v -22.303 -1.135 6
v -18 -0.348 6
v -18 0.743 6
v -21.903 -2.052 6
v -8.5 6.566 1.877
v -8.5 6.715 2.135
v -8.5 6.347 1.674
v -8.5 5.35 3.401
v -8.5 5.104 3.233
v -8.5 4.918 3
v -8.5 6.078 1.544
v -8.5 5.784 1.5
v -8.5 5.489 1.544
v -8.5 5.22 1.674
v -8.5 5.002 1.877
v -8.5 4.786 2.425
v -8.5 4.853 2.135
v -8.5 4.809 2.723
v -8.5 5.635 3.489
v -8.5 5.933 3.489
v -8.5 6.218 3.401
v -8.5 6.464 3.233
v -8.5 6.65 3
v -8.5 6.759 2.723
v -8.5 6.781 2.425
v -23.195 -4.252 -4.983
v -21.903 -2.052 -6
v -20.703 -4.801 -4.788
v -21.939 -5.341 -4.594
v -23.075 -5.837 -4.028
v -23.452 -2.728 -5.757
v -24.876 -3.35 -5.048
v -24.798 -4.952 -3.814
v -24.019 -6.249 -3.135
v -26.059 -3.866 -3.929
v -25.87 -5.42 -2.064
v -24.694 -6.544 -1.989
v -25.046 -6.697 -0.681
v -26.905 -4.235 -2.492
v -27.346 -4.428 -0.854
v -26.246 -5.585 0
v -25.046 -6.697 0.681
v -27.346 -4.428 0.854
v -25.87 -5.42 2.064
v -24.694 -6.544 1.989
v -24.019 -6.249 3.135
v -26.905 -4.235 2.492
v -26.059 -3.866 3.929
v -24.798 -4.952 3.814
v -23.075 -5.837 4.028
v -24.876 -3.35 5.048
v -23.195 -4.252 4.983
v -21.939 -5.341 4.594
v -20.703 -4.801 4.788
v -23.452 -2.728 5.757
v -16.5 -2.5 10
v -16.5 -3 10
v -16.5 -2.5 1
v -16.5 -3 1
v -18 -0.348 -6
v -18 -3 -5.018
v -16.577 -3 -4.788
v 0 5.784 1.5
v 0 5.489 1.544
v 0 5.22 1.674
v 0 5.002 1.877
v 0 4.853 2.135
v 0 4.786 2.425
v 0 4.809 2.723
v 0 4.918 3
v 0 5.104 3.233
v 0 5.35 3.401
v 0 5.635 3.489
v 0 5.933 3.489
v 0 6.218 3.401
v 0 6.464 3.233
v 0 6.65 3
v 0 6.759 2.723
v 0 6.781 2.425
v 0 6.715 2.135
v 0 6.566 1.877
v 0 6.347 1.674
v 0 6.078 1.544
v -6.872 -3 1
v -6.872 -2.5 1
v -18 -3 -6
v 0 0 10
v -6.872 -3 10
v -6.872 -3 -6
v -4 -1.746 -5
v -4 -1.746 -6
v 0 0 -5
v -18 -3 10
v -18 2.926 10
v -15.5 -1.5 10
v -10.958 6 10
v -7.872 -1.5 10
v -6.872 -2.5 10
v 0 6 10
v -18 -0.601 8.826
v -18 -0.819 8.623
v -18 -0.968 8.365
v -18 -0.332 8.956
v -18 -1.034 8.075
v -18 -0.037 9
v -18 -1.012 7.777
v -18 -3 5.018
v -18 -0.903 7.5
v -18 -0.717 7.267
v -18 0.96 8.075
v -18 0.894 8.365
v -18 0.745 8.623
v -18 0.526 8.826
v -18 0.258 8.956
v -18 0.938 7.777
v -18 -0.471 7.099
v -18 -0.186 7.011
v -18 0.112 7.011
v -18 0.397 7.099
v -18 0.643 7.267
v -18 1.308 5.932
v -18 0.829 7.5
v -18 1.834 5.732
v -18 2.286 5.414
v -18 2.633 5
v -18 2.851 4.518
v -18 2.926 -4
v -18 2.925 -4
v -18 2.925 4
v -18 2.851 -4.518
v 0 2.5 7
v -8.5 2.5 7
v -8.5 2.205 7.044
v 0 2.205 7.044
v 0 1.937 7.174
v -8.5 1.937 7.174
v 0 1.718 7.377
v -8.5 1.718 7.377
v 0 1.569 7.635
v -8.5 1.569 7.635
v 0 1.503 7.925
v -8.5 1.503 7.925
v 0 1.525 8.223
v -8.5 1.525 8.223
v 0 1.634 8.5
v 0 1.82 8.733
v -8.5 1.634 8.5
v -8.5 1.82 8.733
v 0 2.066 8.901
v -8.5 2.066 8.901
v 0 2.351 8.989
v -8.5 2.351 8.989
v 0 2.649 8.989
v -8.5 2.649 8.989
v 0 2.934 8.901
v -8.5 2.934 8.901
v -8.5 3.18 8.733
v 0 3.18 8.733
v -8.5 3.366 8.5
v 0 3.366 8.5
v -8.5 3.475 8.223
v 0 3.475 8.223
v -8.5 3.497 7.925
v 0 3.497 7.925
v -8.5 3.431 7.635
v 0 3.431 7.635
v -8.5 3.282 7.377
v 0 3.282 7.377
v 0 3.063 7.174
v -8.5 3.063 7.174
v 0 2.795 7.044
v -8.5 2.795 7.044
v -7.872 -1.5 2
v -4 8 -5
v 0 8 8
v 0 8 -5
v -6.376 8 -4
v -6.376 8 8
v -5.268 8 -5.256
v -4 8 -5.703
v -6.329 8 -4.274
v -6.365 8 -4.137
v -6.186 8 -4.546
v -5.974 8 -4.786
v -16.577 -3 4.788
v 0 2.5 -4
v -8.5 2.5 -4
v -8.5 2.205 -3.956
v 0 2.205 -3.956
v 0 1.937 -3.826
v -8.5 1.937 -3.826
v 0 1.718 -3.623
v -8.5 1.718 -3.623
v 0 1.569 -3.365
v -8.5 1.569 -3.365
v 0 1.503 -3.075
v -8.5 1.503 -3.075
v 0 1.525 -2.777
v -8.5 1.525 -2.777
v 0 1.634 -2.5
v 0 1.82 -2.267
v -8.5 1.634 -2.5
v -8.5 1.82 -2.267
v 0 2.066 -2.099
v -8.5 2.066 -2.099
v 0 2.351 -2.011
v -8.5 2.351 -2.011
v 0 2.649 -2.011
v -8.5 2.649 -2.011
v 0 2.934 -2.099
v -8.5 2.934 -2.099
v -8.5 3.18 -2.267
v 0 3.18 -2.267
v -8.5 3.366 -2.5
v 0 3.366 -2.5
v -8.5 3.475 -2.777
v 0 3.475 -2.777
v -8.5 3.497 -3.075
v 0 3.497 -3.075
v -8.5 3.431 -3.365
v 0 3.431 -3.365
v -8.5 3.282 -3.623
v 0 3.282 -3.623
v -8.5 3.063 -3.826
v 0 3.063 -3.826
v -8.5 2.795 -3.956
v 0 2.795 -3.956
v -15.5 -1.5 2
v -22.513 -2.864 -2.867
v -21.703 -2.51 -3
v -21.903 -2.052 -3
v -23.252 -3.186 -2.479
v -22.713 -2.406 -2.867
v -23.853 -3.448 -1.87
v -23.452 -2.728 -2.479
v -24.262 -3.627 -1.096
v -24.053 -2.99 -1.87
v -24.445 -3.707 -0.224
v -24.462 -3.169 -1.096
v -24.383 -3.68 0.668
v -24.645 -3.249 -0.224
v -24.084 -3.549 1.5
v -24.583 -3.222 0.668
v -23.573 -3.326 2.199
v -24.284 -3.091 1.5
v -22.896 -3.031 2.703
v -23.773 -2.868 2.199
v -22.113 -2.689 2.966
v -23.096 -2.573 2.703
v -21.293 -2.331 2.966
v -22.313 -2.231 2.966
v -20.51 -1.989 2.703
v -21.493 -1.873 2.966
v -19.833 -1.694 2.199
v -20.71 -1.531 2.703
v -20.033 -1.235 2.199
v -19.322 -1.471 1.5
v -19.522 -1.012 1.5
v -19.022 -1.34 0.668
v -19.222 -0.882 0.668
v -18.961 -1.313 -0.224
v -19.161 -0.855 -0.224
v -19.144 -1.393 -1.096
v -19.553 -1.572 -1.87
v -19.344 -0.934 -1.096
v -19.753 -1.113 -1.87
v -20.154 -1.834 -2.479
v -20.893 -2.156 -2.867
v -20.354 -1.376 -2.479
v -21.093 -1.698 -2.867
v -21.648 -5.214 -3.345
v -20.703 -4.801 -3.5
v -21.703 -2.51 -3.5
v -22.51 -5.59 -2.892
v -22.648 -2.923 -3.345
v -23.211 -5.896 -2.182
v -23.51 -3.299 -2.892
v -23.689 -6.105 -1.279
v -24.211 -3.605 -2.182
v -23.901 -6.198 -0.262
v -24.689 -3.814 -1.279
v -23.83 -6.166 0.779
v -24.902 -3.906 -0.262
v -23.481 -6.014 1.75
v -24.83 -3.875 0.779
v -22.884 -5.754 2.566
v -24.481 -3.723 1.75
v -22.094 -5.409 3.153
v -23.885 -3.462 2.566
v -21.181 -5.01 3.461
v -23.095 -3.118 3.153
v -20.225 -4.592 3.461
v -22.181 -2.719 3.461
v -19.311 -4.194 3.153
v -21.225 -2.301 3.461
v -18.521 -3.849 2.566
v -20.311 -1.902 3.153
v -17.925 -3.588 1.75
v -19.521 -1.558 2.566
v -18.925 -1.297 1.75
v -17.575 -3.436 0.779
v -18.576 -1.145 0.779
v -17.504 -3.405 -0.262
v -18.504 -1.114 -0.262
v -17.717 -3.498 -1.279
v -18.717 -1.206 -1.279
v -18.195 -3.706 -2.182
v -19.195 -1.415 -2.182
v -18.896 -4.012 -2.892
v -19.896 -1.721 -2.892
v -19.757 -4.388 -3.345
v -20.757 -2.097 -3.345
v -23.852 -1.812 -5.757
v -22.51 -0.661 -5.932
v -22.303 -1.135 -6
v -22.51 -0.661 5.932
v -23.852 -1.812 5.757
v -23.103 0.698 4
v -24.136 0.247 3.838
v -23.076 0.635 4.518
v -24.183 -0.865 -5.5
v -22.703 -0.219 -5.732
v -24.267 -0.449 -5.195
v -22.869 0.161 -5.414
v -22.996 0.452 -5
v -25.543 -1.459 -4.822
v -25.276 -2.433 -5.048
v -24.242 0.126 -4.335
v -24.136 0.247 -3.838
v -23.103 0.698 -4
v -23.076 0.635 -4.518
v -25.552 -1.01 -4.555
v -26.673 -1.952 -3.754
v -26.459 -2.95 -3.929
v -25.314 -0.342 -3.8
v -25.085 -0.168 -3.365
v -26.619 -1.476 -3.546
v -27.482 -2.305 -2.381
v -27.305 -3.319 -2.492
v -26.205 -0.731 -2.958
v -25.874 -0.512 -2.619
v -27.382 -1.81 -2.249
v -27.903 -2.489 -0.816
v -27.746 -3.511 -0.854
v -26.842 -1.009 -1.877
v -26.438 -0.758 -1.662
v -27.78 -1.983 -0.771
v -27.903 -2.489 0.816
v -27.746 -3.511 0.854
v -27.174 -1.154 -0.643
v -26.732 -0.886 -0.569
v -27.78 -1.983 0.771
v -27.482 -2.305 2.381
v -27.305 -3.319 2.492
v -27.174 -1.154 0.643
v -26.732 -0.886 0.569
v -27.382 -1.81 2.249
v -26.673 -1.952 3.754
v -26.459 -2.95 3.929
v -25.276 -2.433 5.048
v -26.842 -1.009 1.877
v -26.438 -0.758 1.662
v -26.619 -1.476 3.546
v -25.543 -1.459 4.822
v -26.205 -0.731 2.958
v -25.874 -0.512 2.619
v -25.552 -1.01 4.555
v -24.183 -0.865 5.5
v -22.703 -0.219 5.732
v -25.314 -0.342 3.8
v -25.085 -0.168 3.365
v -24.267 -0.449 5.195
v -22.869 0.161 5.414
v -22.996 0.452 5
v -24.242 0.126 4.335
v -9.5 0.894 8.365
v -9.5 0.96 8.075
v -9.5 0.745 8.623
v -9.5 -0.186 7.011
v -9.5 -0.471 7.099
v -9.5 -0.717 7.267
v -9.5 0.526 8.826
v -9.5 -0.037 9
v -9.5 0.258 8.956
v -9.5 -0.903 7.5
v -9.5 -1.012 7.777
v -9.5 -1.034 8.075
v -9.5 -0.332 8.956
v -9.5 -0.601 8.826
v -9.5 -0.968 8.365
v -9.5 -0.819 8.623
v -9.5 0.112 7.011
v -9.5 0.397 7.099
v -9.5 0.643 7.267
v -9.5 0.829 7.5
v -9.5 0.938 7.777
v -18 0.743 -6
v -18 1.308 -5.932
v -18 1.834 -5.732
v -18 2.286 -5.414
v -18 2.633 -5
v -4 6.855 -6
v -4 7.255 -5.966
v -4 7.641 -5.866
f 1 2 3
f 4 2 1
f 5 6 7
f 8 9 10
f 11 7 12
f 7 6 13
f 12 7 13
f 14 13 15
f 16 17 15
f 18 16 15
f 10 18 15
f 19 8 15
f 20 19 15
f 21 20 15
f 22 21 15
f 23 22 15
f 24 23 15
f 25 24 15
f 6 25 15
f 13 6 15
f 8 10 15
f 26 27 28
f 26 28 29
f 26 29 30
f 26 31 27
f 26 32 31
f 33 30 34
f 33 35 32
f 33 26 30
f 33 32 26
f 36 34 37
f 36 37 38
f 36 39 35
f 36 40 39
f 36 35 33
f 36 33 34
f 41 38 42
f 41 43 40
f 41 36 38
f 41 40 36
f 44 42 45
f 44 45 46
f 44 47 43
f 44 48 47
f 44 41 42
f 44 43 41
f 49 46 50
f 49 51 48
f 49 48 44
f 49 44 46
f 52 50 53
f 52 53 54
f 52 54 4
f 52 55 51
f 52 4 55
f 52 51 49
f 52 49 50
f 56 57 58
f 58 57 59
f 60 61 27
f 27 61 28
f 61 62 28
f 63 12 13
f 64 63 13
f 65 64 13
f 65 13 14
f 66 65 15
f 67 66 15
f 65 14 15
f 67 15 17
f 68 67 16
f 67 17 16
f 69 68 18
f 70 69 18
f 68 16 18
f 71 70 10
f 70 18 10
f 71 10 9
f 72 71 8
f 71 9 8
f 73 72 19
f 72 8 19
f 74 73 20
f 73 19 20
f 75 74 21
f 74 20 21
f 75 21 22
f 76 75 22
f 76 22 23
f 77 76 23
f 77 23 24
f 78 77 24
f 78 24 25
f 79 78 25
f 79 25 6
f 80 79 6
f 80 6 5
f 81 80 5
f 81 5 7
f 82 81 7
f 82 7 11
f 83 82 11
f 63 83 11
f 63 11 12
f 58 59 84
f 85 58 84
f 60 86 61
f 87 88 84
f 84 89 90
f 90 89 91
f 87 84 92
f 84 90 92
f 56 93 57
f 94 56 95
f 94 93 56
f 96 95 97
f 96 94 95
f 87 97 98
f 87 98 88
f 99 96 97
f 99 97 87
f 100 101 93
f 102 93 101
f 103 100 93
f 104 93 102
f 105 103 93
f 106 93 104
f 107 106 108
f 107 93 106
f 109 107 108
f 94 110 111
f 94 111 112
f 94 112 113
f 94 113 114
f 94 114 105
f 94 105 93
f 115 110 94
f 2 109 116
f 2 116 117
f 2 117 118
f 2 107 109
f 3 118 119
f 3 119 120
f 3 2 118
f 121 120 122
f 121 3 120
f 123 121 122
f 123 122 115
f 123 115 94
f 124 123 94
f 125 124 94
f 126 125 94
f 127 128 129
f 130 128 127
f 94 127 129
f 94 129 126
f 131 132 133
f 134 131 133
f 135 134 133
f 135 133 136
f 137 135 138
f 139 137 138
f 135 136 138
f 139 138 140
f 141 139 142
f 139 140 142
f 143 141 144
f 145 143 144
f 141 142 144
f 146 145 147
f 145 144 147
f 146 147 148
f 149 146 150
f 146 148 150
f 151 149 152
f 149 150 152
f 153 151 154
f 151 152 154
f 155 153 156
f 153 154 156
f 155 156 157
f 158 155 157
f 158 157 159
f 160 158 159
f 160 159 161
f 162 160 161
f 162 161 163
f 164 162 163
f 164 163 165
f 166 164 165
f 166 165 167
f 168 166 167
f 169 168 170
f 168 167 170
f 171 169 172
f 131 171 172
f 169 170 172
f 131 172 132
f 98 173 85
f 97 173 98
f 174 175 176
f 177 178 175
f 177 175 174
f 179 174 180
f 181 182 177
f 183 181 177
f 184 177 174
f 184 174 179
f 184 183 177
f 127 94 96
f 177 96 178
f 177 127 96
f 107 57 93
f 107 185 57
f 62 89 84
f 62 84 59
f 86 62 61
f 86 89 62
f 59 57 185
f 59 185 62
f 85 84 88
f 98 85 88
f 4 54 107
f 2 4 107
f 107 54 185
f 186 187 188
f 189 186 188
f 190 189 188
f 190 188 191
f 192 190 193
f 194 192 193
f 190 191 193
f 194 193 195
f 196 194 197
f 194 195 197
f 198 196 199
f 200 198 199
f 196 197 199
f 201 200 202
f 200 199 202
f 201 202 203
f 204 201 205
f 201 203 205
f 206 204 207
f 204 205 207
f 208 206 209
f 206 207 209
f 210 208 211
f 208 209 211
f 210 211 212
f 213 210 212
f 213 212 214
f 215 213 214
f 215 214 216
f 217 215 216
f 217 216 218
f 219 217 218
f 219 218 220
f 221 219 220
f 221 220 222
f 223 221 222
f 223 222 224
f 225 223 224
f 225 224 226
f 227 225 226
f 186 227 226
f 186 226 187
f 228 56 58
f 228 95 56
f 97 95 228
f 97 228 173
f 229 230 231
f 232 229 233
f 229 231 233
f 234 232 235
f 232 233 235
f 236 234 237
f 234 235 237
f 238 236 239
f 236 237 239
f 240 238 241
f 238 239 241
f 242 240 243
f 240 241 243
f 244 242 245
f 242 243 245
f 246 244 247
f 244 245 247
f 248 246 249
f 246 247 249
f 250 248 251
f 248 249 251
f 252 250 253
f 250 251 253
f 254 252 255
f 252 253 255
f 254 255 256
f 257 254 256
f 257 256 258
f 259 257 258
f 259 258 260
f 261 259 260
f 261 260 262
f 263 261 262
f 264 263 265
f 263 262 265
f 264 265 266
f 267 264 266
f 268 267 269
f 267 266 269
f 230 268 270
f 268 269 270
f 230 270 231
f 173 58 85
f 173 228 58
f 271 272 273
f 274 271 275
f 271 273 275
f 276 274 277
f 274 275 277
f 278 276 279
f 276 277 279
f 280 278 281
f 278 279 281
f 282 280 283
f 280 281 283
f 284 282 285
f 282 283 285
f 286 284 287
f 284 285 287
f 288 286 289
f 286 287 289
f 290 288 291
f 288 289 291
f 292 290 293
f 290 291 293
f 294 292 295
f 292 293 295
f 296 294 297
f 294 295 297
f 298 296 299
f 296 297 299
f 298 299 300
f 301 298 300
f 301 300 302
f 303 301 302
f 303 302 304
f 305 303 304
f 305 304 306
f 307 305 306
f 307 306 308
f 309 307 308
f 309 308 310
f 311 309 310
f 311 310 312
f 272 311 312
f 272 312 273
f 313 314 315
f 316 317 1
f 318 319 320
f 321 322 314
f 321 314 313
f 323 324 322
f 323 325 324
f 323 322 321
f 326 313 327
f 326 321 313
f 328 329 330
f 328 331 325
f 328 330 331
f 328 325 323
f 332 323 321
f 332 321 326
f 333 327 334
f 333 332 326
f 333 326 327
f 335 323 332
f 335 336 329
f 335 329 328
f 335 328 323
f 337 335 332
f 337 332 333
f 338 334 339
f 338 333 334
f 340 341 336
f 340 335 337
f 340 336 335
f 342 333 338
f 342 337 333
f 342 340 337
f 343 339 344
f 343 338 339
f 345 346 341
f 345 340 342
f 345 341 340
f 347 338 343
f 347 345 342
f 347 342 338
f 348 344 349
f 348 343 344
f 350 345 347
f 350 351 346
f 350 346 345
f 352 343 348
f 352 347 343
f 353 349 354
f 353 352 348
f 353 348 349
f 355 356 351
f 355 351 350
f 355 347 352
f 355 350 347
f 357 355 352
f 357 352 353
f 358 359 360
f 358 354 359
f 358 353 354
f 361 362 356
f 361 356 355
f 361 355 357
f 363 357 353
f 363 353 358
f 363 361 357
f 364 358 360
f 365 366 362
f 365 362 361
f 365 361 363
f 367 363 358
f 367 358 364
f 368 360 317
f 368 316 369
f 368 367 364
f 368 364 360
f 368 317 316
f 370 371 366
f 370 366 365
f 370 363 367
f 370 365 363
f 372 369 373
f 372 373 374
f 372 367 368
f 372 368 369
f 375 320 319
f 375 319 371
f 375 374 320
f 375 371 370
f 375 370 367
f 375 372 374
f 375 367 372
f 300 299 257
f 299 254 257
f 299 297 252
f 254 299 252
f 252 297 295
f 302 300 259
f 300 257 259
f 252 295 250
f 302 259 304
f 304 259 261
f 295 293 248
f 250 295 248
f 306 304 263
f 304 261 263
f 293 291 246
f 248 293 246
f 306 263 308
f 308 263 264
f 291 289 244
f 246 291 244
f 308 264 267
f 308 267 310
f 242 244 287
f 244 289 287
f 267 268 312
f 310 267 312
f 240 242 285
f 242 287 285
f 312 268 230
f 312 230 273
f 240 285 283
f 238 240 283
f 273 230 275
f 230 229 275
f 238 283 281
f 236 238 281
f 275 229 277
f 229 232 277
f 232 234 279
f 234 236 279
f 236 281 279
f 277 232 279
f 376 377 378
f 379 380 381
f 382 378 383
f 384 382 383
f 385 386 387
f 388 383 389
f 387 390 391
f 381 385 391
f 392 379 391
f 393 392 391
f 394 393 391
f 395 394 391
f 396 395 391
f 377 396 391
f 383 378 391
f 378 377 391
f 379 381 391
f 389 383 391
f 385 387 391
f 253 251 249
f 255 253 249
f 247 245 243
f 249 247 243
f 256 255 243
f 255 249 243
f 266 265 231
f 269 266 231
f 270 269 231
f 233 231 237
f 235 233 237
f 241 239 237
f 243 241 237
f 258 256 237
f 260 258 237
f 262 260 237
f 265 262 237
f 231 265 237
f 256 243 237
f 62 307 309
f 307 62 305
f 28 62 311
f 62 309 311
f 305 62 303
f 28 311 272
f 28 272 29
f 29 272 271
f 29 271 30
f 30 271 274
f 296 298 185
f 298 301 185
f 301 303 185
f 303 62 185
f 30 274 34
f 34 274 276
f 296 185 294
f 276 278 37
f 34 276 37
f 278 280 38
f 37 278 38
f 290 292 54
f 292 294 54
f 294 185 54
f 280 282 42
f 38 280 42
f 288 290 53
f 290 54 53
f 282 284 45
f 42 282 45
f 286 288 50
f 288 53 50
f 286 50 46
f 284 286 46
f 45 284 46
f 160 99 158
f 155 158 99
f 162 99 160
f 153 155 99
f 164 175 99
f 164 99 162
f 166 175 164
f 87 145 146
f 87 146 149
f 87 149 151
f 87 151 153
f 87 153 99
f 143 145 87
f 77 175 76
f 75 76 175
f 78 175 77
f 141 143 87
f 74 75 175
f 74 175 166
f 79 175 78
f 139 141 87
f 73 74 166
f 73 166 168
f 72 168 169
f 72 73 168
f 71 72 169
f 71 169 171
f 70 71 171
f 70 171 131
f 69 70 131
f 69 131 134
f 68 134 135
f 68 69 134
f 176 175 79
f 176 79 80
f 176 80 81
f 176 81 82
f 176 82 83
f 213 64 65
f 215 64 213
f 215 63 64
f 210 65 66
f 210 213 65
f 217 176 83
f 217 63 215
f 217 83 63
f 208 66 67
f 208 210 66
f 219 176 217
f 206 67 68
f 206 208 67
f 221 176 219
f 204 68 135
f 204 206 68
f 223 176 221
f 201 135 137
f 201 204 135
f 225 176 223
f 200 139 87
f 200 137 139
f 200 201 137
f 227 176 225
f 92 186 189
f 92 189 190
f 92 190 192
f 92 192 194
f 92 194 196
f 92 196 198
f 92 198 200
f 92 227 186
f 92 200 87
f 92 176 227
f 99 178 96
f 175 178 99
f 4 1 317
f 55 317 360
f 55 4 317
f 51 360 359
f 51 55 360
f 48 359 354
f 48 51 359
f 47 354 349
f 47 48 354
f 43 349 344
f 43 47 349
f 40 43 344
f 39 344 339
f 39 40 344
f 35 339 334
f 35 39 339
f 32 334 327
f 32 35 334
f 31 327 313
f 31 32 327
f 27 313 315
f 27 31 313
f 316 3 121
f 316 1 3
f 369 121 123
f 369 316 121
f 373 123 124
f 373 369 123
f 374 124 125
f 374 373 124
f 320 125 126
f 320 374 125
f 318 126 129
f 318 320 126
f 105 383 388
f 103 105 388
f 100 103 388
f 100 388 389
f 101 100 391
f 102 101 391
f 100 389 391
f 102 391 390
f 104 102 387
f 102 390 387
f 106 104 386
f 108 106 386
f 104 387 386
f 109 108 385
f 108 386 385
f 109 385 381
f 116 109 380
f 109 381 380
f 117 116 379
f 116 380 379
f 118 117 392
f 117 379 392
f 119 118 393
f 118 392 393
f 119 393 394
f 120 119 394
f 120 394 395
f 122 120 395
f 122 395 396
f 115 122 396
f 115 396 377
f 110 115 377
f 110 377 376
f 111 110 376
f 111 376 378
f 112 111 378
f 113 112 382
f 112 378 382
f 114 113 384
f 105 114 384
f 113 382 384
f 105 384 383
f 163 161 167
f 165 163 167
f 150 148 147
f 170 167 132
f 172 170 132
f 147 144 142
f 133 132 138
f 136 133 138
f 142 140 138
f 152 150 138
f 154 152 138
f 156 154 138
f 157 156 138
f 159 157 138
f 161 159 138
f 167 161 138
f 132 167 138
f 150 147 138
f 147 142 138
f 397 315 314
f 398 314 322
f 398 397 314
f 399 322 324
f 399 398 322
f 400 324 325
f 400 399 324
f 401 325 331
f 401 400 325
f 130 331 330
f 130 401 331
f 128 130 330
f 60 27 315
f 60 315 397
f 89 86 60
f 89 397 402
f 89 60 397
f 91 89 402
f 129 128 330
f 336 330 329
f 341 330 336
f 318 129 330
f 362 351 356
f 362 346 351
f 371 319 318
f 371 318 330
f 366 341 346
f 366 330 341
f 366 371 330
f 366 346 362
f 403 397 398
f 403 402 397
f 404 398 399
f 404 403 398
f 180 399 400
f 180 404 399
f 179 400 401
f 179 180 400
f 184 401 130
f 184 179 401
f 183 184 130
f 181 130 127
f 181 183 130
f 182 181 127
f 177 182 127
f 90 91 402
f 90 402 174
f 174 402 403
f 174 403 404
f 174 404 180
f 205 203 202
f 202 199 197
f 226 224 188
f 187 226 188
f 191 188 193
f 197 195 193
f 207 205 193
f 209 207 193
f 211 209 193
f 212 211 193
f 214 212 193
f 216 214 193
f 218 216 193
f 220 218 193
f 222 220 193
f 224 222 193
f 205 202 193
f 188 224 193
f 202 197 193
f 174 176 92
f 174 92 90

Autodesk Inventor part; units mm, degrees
ref_plane "YZ Plane" through (0, 0, 0) normal (1, 0, 0) x (0, 1, 0)
sketch "Sketch1" plane through (0, 0, 0) normal (0, 0, 1) x (1, 0, 0)
  line L0 (0, 0) -> (-18, 0) construction
  line L1 (-9.705, 0) -> (-20.7027, -4.8012) construction
  line L2 (-20.7027, -4.8012) -> (-21.1028, -3.8847) construction
  dimension "d0" = 18
  dimension "d1" = 9.705
  dimension "d2" = 23.584
  dimension "d3" = 1
  dimension "d4" = 12
ref_plane "Work Plane1" through (-20.7027, -4.8012, 0) normal (-0.4001, 0.9165, 0) x (-0.9165, -0.4001, 0)
sketch "Sketch3" plane through (-20.7027, -4.8012, 0) normal (-0.4001, 0.9165, 0) x (-0.9165, -0.4001, 0)
  circle A0 centre (0, 0) radius 6
  line L0 (0, -6) -> (-8, -6)
  line L1 (-8, -6) -> (-8, 6)
  line L2 (-8, 6) -> (0, 6)
  line L3 (0, 6) -> (0, -6)
  point P0 (-20.8944, 0)
  point P1 (0, 0)
  dimension "d8" = 12
  dimension "d13" = 8
extrude "Extrusion2" add sketch "Sketch3" along normal blind 6
chamfer "Chamfer2" distance 3 angle 22 3 edges at (-26.2015, -7.2018, 0) (-17.0368, -3.2008, -6) (-17.0368, -3.2008, 6) measured on face at (-26.265, -5.0472, -3) measured on face at (-16.615, -0.8344, 6) measured on face at (-19.0589, -1.9013, -6)
sketch "Sketch2" plane through (0, 0, 0) normal (0, 0, 1) x (1, 0, 0)
  line L0 (-6.8718, -3) -> (-18, -3)
  line L1 (-18, -3) -> (-18, 2.9255)
  line L2 (-18, 2.9255) -> (0, 10.7837)
  line L3 (0, 10.7837) -> (0, 0)
  line L4 (-9.705, 0) -> (-20.7027, -4.8012) construction
  line L5 (-6.8718, -3) -> (0, 0)
  point P0 (0, 0)
  point P1 (-18, 0)
  point P2 (0, 0)
  dimension "d12" = 3
  dimension "d22" = 3
  dimension "d38" = 6
extrude "Extrusion1" add sketch "Sketch2" along normal blind 10 and the other way blind 6
sketch "Sketch5" plane through (-20.7027, -4.8012, 0) normal (0.4001, -0.9165, 0) x (0.9165, 0.4001, 0)
  point P0 (20.8944, 0)
  point P1 (0, 0)
hole "CMC bearing" at (-20.7027, -4.8012, 0) direction (-0.4001, 0.9165, 0) diameter 6 depth 3 counterbore diameter 7 counterbore depth 2.5
sketch "Sketch6" plane through (-18, -3, 10) normal (-1, 0, 0) x (0, 0, 1)
  line L0 (0, 5.9255) -> (0, 0) projected
  line L1 (0, 5.9255) -> (-4, 5.9255) projected
  line L2 (0, 0) -> (-4.982, 0) projected
  line L3 (-2, 5.9255) -> (-2, 0) construction
  point P0 (-10, 3)
  point P1 (-2, 2.9628)
hole "top mount" at (-18, -0.0372, 8) direction (1, 0, 0) diameter 2 depth 8.5
sketch "Sketch8" plane through (-6.8718, -3, -6) normal (0, 0, -1) x (-1, 0, 0)
  line L0 (-6.8718, 3) -> (0, 0) projected
  line L1 (-6.8718, 13.7837) -> (-6.8718, 3) projected
  line L2 (16.2314, 3.6976) -> (-6.8718, 13.7837) projected
  line L3 (-2.8718, 1.2537) -> (-2.8718, 12.0374)
  dimension "d56" = 4
extrude "Extrusion3" cut sketch "Sketch8" against normal blind 1
sketch "Sketch7" plane through (0, 0, 10) normal (1, 0, 0) x (0, 0, -1)
  line L0 (0, 10.7837) -> (15, 10.7837) projected
  line L1 (0, 0) -> (0, 10.7837) projected
  line L2 (0, 0) -> (15, 0) projected
  line L3 (7.5, 0) -> (7.5, 10.7837) construction
  line L4 (15, 0) -> (15, 10.7837) projected
  point P0 (10, 0)
  point P1 (2, 2.5)
  point P2 (13, 2.5)
  point P3 (7.5, 5.7837)
  dimension "d46" = 5
  dimension "d47" = 11
  dimension "d48" = 2.5
hole "bottom mount" at (0, 2.5, 8) at (0, 5.7837, 2.5) at (0, 2.5, -3) direction (-1, 0, 0) diameter 2 depth 8.5
sketch "Sketch9" plane through (-18, -3, -6) normal (0, -1, 0) x (1, 0, 0)
  line L0 (0, 16) -> (11.1282, 16) projected
  line L1 (11.1282, 16) -> (1.5, 16)
  line L2 (1.5, 16) -> (1.5, 7)
  line L3 (1.5, 7) -> (11.1282, 7)
  line L4 (11.1282, 7) -> (11.1282, 16)
  point P0 (18, 6)
  dimension "d59" = 9
  dimension "d60" = 1.5
extrude "Extrusion4" cut sketch "Sketch9" against normal blind 1.5
chamfer "Chamfer3" distance 1 angle 45 3 edges at (-16.5, -1.5, 5.5) (-6.8718, -1.5, 5.5) (-11.6859, -1.5, 1)
ref_plane "Work Plane2" through (0, 8, 0) normal (0, 1, 0) x (-1, 0, 0)
split "Split1" plane through (0, 8, 0) removes the side toward (0, 1, 0)
chamfer "Chamfer4" distance 2 angle 45 1 edges at (-3.1882, 8, 10)
fillet "Fillet1" radius 2 3 edges at (-20.5516, 1.8116, 6) (-14.7398, 4.3488, -6) (-28.6021, -1.7029, 0)
equation "\"d2\" = thumb_axis_beta_local"
equation "\"thumb_axis_beta_local\" = thumb_axis_beta"
properties part number "thumb_03 CMC top hinge"
